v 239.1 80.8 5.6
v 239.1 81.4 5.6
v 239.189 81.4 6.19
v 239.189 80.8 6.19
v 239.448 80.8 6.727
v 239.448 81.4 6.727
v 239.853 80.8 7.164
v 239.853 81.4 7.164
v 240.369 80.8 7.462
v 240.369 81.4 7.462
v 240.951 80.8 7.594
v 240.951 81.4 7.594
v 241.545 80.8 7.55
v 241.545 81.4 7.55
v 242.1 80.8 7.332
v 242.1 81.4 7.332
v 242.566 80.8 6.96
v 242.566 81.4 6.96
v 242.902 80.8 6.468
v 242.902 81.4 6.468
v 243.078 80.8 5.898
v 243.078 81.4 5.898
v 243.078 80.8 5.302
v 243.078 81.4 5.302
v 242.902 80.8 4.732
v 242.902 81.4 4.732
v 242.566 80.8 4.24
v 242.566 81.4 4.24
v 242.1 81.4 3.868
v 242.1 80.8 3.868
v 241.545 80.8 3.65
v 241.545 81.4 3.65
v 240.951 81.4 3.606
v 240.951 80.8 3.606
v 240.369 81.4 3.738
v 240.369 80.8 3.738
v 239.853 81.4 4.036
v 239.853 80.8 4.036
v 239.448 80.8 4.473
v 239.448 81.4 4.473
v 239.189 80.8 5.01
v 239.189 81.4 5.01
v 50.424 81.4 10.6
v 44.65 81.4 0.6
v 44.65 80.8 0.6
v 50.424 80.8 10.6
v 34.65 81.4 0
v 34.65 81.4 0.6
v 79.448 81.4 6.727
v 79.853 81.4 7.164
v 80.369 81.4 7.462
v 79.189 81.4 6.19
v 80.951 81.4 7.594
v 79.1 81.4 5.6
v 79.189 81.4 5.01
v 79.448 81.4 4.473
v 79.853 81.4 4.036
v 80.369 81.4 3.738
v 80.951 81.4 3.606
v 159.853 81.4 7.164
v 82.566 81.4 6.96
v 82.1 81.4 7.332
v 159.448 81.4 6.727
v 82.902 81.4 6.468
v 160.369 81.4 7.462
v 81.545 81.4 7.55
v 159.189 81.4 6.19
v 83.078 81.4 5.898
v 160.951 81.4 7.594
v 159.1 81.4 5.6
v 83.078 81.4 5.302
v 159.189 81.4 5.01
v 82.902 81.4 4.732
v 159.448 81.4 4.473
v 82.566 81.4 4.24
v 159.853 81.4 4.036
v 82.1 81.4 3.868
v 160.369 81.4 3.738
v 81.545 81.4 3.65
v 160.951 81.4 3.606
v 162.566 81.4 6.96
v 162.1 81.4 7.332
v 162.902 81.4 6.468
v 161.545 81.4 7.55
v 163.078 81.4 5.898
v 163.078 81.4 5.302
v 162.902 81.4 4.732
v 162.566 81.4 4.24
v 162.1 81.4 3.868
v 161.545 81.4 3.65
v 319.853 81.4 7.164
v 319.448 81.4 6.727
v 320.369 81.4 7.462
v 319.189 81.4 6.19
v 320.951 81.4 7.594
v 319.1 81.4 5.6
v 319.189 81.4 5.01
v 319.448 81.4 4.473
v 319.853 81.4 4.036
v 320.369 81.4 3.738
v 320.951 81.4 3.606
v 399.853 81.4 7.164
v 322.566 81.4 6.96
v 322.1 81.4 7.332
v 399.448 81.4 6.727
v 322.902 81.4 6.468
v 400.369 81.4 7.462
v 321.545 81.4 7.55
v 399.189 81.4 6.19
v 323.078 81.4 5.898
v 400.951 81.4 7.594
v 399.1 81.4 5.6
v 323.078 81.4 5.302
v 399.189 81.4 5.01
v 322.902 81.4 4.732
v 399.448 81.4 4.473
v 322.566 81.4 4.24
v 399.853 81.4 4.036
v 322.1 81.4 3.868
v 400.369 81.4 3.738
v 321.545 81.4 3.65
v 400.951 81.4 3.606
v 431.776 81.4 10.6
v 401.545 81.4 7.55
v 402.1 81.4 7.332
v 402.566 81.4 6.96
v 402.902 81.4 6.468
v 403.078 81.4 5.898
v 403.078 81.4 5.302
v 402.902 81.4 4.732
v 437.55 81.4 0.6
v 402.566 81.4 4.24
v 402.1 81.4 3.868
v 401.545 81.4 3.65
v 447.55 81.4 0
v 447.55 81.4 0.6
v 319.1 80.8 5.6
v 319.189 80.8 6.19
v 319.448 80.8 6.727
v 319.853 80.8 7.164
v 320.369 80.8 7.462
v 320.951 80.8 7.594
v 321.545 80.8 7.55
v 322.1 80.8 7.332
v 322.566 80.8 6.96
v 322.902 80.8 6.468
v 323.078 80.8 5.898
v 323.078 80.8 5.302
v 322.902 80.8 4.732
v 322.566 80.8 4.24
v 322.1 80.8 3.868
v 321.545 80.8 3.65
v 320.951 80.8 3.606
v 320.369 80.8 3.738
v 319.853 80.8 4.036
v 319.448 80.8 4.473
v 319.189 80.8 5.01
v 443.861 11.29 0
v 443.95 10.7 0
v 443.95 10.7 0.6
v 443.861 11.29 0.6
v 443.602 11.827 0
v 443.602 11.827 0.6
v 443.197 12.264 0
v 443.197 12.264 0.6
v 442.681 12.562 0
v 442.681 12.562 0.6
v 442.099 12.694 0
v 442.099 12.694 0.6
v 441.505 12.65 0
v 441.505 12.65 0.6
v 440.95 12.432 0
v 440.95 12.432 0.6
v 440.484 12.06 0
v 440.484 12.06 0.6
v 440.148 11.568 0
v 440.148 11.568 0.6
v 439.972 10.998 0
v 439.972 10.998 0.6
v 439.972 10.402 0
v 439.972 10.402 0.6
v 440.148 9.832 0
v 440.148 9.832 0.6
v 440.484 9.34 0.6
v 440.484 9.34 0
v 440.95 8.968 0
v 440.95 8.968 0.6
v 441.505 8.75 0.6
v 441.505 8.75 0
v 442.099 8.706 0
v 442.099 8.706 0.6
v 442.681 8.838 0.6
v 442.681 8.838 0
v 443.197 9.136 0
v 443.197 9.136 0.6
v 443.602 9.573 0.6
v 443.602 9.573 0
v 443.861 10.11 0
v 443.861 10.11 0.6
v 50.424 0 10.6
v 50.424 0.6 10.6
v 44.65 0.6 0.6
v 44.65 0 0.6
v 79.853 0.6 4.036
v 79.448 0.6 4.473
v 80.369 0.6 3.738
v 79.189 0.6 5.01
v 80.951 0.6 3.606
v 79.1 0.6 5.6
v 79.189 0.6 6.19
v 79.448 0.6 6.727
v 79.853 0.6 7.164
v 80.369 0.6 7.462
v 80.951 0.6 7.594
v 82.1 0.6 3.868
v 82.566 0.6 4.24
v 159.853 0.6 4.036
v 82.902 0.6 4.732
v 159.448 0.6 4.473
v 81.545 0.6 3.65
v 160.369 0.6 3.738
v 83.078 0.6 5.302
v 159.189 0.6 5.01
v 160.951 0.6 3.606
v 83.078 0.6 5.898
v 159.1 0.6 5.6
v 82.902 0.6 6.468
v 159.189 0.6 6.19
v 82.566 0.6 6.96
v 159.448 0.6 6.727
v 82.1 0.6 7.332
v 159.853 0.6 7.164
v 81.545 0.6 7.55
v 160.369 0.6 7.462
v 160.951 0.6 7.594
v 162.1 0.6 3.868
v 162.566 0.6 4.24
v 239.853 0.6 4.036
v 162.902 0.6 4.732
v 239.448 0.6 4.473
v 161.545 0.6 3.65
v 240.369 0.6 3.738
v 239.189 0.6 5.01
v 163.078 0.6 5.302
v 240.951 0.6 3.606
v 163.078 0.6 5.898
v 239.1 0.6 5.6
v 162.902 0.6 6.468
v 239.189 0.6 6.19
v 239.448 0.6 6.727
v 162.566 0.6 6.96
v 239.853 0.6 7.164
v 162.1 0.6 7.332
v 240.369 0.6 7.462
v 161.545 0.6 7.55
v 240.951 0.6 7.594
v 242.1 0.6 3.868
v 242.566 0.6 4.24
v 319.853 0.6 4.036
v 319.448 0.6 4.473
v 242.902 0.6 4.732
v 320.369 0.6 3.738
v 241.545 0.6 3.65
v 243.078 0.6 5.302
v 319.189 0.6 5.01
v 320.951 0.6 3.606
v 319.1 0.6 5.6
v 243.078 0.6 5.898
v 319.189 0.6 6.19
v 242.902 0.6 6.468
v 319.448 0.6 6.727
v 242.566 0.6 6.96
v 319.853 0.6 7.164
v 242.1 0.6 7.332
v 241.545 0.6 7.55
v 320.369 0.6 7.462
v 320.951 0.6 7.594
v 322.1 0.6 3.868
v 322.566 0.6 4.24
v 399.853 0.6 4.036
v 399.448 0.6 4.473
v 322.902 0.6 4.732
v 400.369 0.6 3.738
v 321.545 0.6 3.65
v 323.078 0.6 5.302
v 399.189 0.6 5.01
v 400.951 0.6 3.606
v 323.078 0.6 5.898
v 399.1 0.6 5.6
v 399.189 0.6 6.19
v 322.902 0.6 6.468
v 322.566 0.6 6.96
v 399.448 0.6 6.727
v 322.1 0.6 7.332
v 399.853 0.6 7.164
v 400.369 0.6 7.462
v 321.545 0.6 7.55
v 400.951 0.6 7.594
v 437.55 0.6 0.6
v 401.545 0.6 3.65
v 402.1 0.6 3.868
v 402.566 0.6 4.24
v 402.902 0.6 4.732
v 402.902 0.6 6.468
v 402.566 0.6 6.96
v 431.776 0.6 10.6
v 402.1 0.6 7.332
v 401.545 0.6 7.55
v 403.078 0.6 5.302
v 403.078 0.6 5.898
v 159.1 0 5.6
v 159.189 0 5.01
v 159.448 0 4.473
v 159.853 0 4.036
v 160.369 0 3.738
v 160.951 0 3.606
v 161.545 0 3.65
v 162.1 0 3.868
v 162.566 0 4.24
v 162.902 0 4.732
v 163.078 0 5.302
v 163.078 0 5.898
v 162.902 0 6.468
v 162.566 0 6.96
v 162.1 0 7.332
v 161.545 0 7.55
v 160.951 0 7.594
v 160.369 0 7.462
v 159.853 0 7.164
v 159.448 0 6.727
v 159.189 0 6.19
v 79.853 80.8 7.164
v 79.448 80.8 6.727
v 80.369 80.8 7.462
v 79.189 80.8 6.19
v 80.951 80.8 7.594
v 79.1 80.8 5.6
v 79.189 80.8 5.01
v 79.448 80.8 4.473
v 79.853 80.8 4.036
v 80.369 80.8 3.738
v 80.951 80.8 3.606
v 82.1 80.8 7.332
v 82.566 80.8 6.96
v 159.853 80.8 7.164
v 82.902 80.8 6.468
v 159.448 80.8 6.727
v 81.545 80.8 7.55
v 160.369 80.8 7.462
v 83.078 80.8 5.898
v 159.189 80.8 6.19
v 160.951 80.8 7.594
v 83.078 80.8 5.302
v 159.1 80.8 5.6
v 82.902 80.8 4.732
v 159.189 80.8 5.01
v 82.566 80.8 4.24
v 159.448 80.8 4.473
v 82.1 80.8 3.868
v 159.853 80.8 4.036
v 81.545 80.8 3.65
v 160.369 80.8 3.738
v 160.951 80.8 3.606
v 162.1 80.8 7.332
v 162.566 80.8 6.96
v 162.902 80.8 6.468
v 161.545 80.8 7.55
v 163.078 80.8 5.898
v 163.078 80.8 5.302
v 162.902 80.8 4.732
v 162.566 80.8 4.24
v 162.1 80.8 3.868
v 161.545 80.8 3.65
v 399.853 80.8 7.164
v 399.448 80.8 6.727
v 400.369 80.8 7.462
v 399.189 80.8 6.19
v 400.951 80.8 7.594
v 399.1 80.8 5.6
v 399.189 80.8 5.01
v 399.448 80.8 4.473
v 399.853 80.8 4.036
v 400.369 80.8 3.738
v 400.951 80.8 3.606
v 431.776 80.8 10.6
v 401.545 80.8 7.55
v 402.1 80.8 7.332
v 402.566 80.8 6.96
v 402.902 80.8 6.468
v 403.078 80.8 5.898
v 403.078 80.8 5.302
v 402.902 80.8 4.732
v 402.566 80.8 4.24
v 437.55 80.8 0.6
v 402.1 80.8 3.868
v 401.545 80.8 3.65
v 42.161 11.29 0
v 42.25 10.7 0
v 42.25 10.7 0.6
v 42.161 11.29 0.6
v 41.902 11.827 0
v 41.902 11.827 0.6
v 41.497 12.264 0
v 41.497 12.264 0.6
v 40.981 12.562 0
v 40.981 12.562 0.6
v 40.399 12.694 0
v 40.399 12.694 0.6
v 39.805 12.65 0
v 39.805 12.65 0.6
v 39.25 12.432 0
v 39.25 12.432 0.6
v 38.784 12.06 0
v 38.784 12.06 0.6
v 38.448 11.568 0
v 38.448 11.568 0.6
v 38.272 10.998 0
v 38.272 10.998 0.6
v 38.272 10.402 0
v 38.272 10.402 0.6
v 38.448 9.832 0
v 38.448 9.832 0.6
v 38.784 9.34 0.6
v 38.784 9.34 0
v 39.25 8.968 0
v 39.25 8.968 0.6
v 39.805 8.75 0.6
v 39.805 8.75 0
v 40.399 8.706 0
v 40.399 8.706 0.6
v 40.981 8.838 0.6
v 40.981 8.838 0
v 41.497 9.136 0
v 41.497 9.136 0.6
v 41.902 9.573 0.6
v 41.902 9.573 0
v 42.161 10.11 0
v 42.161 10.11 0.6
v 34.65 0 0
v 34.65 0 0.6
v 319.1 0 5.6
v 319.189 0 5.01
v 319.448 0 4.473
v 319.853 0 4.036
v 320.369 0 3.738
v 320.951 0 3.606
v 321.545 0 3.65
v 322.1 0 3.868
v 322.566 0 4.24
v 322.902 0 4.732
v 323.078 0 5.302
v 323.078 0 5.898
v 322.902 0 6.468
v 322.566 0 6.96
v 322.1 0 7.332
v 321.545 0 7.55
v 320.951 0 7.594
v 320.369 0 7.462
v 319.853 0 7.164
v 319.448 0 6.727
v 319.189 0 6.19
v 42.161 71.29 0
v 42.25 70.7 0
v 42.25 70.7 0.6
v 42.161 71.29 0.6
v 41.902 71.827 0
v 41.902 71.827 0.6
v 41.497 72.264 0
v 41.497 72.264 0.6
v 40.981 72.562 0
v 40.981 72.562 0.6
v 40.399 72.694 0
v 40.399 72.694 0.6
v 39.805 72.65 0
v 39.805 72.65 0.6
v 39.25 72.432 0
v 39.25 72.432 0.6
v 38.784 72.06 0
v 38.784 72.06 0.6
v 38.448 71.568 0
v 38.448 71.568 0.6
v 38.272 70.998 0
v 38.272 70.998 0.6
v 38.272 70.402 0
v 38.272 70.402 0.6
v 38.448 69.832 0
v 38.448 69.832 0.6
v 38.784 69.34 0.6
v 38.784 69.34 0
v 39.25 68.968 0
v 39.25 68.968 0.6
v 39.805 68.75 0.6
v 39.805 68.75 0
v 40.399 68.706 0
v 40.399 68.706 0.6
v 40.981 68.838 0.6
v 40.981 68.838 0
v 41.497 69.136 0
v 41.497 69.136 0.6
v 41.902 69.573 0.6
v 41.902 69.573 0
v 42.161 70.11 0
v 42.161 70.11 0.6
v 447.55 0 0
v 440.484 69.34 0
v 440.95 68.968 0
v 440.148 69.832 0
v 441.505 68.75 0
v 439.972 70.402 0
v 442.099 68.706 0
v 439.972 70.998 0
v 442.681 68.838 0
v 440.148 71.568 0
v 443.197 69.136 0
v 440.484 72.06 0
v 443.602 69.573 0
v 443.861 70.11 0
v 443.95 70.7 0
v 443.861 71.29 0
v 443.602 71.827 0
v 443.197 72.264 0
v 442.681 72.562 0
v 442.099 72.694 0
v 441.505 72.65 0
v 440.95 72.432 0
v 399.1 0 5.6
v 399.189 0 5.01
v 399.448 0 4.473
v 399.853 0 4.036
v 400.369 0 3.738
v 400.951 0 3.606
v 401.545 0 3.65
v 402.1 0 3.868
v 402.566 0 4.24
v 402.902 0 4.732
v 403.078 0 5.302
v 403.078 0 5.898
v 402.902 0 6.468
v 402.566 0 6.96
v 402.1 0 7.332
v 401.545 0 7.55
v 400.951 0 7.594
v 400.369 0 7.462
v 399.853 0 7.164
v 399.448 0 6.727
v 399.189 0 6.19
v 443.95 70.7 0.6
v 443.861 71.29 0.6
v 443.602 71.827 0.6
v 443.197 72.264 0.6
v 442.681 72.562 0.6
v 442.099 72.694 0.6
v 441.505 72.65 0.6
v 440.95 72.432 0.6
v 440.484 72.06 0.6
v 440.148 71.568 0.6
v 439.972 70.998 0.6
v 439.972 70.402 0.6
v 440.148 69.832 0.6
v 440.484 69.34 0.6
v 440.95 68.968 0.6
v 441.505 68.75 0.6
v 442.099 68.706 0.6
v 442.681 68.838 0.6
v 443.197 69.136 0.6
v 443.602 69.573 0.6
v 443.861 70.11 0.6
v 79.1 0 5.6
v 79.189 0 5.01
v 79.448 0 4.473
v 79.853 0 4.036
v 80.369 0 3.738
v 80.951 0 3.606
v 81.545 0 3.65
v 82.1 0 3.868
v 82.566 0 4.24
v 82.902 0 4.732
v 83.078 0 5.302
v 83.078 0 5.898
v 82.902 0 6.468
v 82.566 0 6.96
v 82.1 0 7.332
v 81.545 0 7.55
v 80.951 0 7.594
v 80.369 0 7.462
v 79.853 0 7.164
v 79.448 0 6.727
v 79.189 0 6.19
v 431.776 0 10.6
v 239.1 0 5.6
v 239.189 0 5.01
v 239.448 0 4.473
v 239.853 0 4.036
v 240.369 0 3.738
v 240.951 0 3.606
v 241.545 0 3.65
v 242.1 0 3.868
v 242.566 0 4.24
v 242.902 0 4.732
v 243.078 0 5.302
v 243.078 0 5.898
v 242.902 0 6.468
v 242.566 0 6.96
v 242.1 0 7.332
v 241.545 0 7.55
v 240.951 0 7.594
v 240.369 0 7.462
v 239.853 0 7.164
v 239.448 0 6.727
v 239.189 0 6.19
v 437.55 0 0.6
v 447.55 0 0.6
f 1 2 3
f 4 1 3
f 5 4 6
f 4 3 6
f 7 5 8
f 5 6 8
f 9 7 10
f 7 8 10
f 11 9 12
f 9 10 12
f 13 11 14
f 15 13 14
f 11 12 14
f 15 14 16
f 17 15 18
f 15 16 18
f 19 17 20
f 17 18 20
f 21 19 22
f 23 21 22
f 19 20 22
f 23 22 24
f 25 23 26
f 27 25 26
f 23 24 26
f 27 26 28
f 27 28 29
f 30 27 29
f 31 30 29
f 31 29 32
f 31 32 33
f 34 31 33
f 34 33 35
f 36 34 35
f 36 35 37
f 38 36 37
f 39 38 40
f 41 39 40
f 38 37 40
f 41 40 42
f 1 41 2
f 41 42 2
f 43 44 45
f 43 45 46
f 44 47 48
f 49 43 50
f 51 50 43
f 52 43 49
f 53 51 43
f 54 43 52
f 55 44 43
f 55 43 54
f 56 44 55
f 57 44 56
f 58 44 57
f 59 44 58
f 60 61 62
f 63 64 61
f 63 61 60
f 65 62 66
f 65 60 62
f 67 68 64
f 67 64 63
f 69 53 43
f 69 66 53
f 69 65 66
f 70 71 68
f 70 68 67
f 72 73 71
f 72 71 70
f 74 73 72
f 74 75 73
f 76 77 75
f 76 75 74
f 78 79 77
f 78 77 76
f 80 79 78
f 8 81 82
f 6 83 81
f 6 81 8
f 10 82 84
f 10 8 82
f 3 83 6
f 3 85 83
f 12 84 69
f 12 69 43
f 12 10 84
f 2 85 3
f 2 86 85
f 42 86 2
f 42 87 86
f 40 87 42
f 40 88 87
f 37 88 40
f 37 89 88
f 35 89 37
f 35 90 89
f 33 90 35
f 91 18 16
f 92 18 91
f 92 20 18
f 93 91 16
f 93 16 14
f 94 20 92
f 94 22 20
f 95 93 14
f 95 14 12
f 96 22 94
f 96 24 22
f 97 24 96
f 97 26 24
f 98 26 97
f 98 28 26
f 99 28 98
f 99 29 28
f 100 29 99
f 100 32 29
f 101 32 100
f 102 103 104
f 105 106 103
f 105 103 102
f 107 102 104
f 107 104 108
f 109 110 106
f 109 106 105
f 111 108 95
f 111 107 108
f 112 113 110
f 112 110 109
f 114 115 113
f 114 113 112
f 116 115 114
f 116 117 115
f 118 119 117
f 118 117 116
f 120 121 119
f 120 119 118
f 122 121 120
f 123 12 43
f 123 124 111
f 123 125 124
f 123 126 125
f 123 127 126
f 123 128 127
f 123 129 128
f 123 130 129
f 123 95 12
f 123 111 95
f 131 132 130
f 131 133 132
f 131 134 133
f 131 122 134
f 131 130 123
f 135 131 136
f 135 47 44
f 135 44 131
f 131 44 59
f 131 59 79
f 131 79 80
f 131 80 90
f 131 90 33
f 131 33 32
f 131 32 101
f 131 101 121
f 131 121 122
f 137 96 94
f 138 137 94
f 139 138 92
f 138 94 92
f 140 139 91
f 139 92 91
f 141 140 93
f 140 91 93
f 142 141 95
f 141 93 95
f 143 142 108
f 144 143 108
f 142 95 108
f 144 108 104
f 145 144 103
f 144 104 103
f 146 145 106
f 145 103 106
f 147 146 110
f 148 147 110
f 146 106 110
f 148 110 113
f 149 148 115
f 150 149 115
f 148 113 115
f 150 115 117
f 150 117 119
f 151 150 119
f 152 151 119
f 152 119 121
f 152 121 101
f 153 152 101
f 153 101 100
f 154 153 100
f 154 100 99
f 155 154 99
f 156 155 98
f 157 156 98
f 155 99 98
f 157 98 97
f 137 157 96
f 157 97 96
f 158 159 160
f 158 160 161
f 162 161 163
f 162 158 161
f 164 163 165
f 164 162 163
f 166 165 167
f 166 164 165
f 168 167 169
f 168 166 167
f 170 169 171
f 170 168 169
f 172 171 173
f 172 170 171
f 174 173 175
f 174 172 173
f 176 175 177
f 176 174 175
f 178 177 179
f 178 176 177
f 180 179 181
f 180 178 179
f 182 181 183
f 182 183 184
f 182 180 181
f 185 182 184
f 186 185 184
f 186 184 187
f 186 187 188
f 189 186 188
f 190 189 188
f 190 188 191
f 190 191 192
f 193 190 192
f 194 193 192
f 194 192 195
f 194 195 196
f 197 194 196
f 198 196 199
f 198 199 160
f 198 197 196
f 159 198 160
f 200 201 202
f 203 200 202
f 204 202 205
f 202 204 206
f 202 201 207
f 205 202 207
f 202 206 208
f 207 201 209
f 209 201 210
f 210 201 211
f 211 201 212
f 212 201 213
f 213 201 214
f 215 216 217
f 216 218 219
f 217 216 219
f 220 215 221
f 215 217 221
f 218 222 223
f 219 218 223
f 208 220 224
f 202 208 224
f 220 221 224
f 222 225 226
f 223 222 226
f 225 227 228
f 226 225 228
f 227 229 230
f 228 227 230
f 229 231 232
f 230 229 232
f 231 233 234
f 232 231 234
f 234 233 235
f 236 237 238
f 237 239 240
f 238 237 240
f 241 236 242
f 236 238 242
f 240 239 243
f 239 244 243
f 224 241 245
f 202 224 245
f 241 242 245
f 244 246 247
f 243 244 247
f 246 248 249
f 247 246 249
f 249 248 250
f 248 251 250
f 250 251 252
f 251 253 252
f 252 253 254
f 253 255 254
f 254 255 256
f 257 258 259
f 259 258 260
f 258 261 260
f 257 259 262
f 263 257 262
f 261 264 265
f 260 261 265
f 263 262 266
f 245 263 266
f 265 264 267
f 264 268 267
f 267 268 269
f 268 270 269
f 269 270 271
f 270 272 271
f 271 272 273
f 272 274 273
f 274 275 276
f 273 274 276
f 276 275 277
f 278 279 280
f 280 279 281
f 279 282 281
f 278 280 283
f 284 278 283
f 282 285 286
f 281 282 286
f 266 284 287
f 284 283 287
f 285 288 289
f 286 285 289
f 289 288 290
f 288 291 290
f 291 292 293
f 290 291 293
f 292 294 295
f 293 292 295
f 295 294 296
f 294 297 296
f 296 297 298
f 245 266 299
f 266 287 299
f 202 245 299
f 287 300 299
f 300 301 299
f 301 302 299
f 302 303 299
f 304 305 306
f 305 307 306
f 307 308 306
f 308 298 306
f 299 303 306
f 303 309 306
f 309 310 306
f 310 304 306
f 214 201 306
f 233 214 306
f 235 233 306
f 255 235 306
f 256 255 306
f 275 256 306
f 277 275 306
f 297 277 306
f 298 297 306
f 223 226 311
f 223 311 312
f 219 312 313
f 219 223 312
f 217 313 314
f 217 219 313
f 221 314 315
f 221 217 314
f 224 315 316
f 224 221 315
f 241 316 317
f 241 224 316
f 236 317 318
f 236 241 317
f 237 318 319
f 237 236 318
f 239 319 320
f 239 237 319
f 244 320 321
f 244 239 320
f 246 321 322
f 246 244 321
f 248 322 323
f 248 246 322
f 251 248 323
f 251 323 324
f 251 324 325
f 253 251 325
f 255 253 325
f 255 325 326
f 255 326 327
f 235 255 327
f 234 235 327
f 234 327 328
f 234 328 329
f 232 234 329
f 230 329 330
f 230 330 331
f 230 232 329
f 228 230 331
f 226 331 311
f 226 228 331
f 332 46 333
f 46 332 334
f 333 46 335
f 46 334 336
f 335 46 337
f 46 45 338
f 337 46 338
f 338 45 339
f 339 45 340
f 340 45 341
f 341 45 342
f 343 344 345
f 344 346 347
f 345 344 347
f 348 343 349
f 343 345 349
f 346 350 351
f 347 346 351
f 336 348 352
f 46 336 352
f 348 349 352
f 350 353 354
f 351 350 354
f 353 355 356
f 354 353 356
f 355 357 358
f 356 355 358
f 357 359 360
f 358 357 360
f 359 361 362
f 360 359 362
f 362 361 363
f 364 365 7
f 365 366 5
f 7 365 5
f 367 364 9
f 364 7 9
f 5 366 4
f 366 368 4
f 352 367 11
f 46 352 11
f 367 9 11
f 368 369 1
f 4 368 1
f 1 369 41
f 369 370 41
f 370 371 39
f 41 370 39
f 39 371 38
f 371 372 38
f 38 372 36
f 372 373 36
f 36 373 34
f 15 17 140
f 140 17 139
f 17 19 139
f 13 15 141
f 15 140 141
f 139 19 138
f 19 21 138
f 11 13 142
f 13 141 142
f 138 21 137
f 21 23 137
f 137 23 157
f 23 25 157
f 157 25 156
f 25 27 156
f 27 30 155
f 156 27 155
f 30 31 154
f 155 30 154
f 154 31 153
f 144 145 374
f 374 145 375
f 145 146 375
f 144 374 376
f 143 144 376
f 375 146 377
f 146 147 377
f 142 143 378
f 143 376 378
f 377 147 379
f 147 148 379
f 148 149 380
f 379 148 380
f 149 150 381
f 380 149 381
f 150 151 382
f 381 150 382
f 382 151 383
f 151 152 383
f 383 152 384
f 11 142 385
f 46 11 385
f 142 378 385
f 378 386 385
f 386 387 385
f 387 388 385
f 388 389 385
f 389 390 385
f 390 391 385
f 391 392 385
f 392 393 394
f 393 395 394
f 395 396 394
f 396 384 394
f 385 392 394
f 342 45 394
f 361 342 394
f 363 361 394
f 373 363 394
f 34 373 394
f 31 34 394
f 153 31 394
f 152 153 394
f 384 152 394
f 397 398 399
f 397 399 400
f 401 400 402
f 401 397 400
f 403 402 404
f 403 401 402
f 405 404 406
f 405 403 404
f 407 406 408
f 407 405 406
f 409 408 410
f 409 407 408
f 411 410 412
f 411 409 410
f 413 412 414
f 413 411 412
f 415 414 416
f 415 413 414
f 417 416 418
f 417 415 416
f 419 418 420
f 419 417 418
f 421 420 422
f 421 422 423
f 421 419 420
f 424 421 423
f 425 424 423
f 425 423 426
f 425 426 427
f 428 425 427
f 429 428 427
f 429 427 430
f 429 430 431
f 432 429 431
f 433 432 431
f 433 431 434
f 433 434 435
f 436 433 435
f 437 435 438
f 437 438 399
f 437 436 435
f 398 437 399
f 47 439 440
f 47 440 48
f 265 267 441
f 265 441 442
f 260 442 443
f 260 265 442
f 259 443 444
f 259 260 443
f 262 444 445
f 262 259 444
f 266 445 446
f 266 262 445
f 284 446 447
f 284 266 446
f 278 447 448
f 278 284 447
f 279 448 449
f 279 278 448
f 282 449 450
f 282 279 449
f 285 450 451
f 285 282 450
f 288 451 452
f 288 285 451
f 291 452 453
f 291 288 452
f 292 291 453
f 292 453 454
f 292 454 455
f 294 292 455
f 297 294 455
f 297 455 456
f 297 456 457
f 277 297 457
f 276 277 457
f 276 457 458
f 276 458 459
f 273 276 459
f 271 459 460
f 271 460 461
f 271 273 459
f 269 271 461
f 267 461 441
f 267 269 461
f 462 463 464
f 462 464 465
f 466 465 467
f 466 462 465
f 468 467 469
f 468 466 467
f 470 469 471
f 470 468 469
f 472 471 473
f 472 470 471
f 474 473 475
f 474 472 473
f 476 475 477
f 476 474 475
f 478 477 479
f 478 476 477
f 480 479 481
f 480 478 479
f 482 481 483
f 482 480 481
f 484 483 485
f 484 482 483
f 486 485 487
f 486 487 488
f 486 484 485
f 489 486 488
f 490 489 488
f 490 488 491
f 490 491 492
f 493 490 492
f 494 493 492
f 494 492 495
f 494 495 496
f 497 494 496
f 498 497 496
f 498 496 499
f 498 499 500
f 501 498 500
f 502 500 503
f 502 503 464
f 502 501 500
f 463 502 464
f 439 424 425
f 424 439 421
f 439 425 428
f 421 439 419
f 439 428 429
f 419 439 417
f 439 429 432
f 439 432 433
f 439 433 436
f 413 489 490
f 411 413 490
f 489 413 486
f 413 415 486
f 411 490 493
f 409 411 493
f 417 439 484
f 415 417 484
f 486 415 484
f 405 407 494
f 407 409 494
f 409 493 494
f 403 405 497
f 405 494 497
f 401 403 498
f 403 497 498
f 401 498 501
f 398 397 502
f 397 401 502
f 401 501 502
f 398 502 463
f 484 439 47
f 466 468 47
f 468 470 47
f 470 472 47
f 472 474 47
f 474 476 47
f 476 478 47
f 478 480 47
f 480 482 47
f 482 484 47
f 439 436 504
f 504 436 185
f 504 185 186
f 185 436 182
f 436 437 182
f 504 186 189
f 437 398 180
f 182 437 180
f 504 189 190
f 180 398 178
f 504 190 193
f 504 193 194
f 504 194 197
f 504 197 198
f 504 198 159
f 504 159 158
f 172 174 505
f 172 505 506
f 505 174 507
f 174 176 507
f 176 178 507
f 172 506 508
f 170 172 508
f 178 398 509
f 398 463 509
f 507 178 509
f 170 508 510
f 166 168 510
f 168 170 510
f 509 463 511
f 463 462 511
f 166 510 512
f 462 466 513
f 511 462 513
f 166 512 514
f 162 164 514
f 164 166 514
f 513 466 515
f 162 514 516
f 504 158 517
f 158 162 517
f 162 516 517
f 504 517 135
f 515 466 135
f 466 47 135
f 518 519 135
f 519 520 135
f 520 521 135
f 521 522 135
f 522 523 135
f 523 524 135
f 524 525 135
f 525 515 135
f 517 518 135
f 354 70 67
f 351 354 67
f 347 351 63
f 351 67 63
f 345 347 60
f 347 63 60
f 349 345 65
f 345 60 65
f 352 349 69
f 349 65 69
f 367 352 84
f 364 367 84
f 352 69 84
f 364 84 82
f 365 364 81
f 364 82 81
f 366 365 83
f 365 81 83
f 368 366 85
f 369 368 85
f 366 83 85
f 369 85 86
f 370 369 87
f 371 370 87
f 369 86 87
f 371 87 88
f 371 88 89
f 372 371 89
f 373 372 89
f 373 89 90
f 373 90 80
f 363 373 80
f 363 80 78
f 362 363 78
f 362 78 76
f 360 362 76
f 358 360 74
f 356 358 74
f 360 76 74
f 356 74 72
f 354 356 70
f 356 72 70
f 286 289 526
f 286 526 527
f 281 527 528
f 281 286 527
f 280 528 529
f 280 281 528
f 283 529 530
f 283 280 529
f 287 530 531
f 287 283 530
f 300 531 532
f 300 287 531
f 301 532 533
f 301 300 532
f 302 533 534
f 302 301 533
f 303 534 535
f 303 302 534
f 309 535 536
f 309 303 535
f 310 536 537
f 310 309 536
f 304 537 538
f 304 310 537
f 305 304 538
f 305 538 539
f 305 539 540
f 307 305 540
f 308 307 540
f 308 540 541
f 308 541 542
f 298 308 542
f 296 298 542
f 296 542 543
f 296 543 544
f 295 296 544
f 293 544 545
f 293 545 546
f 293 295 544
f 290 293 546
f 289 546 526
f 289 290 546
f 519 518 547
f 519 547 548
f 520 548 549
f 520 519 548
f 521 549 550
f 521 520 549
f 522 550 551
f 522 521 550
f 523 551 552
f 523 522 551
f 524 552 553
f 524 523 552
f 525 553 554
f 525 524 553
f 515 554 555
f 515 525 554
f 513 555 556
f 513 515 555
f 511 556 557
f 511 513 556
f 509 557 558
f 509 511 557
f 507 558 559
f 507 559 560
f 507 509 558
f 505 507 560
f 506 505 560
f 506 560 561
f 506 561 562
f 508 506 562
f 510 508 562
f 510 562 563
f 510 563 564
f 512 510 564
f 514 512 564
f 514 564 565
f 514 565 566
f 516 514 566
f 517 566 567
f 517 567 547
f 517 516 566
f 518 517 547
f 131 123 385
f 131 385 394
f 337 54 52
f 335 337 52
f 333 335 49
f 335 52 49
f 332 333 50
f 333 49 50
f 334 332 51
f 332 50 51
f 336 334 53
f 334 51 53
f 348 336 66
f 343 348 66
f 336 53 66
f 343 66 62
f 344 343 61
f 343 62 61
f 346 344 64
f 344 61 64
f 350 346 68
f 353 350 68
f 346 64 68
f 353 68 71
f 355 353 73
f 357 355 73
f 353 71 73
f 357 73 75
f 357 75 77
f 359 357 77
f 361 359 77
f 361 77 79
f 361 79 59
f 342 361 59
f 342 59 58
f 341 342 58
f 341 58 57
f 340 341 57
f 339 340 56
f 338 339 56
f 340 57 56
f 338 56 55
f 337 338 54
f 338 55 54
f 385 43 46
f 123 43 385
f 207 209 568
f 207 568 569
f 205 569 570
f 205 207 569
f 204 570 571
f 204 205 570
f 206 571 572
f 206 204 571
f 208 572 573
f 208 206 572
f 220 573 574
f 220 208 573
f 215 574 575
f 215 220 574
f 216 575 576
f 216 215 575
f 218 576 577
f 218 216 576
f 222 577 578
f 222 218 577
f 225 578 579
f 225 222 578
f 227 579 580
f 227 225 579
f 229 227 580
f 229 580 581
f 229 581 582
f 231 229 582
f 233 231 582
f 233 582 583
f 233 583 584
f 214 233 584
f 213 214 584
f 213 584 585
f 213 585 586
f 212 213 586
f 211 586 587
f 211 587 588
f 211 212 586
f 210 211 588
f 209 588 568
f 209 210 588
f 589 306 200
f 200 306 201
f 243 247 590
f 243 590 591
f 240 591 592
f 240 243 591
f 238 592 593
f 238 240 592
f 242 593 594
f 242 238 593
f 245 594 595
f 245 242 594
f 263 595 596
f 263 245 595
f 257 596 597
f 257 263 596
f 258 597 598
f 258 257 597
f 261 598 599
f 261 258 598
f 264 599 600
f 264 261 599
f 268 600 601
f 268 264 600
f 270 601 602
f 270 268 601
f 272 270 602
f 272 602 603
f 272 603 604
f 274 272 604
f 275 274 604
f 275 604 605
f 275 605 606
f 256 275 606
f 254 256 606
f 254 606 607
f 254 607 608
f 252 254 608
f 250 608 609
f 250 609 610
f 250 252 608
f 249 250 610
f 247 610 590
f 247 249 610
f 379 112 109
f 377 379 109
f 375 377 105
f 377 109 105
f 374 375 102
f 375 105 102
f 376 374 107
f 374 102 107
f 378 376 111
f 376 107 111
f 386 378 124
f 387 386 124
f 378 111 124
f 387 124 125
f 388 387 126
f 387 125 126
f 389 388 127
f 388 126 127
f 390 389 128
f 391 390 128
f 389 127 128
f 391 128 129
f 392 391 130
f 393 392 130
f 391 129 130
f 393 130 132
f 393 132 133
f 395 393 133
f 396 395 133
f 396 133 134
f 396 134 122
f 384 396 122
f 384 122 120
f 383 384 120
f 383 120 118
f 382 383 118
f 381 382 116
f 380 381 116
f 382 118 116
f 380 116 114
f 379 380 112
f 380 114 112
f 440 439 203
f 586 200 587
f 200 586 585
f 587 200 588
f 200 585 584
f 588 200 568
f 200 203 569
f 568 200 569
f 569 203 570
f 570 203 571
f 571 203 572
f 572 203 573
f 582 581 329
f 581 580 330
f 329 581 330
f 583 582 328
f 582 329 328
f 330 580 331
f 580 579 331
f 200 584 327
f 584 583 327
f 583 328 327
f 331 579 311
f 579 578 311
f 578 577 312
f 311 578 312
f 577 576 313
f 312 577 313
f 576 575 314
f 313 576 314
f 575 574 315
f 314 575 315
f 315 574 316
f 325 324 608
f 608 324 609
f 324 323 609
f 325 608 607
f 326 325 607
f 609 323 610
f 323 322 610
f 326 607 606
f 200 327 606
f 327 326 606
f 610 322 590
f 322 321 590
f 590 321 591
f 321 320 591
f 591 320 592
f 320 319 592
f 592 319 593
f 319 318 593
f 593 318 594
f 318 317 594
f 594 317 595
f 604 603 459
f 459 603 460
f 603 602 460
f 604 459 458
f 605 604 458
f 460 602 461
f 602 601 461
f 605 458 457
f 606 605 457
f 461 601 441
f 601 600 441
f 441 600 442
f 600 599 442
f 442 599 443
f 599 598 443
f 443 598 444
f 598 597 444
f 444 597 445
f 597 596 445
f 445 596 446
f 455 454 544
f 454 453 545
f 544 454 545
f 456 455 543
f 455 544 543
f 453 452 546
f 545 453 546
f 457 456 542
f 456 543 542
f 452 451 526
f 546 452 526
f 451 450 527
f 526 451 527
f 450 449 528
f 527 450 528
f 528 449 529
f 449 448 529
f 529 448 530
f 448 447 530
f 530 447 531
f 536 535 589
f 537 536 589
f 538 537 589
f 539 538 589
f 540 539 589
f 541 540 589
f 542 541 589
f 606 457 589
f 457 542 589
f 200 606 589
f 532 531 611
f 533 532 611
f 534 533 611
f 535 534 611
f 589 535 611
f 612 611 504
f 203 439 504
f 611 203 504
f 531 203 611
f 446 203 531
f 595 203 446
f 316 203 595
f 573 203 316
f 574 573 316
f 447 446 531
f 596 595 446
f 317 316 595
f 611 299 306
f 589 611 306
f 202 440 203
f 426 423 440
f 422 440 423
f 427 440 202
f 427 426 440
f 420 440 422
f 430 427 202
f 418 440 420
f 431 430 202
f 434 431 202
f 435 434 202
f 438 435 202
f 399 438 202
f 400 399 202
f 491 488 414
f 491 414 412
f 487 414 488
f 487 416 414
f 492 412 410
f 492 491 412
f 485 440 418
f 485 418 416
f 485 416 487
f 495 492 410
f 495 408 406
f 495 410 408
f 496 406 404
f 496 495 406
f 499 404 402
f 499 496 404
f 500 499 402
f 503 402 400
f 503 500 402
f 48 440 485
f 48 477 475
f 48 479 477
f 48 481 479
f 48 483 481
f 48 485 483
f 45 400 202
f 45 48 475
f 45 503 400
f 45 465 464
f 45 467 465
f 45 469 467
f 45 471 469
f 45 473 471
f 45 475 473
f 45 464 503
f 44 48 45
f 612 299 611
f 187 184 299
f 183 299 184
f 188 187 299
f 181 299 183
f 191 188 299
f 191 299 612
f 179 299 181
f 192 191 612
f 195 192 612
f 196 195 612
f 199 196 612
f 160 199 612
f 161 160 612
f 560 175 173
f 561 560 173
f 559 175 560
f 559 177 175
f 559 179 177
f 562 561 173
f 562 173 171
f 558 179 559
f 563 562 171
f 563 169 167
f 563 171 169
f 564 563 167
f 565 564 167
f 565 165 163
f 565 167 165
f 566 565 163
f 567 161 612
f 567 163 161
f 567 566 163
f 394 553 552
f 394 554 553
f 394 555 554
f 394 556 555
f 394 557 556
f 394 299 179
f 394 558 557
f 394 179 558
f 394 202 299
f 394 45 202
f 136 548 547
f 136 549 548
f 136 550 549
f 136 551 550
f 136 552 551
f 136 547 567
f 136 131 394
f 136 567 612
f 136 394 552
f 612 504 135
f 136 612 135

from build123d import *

# Parameters (mm, degrees)
SKETCH_1_W      = 412.9
SKETCH_1_H      = 81.4
SKETCH_1_R      = 2
EXTRUDE_1_DEPTH = 0.6
SKETCH_2_R      = 2
EXTRUDE_2_DEPTH = 0.6
EXTRUDE_START   = -0.6
SKETCH_3_R      = 2
EXTRUDE_3_DEPTH = 0.6


with BuildPart() as part:
    # Эскиз1 → Бобышка-Вытянуть1 (new body)
    with BuildSketch(Plane.XY):
        with Locations((241.1, 40.7)):
            Rectangle(SKETCH_1_W, SKETCH_1_H)
        with Locations((40.25, 10.7)):
            Circle(SKETCH_1_R, mode=Mode.SUBTRACT)
        with Locations((441.95, 10.7)):
            Circle(SKETCH_1_R, mode=Mode.SUBTRACT)
        with Locations((40.25, 70.7)):
            Circle(SKETCH_1_R, mode=Mode.SUBTRACT)
        with Locations((441.95, 70.7)):
            Circle(SKETCH_1_R, mode=Mode.SUBTRACT)
    extrude(amount=EXTRUDE_1_DEPTH)

    # Эскиз2 → Бобышка-Вытянуть2 (add)
    with BuildSketch(Plane(origin=(0, 81.4, 0), x_dir=(1, 0, 0), z_dir=(0, 1, 0))):
        Polygon((44.65, -0.6), (50.423502692, -10.6), (431.776497308, -10.6), (437.55, -0.6), align=None)
        with Locations(Location((401.1, -5.6, 0), (0, 0, 180))):
            Circle(SKETCH_2_R, mode=Mode.SUBTRACT)
        with Locations(Location((321.1, -5.6, 0), (0, 0, 180))):
            Circle(SKETCH_2_R, mode=Mode.SUBTRACT)
        with Locations(Location((241.1, -5.6, 0), (0, 0, 180))):
            Circle(SKETCH_2_R, mode=Mode.SUBTRACT)
        with Locations(Location((161.1, -5.6, 0), (0, 0, 180))):
            Circle(SKETCH_2_R, mode=Mode.SUBTRACT)
        with Locations(Location((81.1, -5.6, 0), (0, 0, 180))):
            Circle(SKETCH_2_R, mode=Mode.SUBTRACT)
    extrude(amount=-EXTRUDE_2_DEPTH)

    # Эскиз3 → Бобышка-Вытянуть3 (add)
    with BuildSketch(Plane.XZ.offset(EXTRUDE_START)):
        Polygon((44.65, 0.6), (437.55, 0.6), (431.776497308, 10.6), (50.423502692, 10.6), align=None)
        with Locations(Location((401.1, 5.6, 0), (0, 0, 180))):
            Circle(SKETCH_3_R, mode=Mode.SUBTRACT)
        with Locations(Location((321.1, 5.6, 0), (0, 0, 180))):
            Circle(SKETCH_3_R, mode=Mode.SUBTRACT)
        with Locations(Location((241.1, 5.6, 0), (0, 0, 180))):
            Circle(SKETCH_3_R, mode=Mode.SUBTRACT)
        with Locations(Location((161.1, 5.6, 0), (0, 0, 180))):
            Circle(SKETCH_3_R, mode=Mode.SUBTRACT)
        with Locations(Location((81.1, 5.6, 0), (0, 0, 180))):
            Circle(SKETCH_3_R, mode=Mode.SUBTRACT)
    extrude(amount=EXTRUDE_3_DEPTH)


solid = part.part
